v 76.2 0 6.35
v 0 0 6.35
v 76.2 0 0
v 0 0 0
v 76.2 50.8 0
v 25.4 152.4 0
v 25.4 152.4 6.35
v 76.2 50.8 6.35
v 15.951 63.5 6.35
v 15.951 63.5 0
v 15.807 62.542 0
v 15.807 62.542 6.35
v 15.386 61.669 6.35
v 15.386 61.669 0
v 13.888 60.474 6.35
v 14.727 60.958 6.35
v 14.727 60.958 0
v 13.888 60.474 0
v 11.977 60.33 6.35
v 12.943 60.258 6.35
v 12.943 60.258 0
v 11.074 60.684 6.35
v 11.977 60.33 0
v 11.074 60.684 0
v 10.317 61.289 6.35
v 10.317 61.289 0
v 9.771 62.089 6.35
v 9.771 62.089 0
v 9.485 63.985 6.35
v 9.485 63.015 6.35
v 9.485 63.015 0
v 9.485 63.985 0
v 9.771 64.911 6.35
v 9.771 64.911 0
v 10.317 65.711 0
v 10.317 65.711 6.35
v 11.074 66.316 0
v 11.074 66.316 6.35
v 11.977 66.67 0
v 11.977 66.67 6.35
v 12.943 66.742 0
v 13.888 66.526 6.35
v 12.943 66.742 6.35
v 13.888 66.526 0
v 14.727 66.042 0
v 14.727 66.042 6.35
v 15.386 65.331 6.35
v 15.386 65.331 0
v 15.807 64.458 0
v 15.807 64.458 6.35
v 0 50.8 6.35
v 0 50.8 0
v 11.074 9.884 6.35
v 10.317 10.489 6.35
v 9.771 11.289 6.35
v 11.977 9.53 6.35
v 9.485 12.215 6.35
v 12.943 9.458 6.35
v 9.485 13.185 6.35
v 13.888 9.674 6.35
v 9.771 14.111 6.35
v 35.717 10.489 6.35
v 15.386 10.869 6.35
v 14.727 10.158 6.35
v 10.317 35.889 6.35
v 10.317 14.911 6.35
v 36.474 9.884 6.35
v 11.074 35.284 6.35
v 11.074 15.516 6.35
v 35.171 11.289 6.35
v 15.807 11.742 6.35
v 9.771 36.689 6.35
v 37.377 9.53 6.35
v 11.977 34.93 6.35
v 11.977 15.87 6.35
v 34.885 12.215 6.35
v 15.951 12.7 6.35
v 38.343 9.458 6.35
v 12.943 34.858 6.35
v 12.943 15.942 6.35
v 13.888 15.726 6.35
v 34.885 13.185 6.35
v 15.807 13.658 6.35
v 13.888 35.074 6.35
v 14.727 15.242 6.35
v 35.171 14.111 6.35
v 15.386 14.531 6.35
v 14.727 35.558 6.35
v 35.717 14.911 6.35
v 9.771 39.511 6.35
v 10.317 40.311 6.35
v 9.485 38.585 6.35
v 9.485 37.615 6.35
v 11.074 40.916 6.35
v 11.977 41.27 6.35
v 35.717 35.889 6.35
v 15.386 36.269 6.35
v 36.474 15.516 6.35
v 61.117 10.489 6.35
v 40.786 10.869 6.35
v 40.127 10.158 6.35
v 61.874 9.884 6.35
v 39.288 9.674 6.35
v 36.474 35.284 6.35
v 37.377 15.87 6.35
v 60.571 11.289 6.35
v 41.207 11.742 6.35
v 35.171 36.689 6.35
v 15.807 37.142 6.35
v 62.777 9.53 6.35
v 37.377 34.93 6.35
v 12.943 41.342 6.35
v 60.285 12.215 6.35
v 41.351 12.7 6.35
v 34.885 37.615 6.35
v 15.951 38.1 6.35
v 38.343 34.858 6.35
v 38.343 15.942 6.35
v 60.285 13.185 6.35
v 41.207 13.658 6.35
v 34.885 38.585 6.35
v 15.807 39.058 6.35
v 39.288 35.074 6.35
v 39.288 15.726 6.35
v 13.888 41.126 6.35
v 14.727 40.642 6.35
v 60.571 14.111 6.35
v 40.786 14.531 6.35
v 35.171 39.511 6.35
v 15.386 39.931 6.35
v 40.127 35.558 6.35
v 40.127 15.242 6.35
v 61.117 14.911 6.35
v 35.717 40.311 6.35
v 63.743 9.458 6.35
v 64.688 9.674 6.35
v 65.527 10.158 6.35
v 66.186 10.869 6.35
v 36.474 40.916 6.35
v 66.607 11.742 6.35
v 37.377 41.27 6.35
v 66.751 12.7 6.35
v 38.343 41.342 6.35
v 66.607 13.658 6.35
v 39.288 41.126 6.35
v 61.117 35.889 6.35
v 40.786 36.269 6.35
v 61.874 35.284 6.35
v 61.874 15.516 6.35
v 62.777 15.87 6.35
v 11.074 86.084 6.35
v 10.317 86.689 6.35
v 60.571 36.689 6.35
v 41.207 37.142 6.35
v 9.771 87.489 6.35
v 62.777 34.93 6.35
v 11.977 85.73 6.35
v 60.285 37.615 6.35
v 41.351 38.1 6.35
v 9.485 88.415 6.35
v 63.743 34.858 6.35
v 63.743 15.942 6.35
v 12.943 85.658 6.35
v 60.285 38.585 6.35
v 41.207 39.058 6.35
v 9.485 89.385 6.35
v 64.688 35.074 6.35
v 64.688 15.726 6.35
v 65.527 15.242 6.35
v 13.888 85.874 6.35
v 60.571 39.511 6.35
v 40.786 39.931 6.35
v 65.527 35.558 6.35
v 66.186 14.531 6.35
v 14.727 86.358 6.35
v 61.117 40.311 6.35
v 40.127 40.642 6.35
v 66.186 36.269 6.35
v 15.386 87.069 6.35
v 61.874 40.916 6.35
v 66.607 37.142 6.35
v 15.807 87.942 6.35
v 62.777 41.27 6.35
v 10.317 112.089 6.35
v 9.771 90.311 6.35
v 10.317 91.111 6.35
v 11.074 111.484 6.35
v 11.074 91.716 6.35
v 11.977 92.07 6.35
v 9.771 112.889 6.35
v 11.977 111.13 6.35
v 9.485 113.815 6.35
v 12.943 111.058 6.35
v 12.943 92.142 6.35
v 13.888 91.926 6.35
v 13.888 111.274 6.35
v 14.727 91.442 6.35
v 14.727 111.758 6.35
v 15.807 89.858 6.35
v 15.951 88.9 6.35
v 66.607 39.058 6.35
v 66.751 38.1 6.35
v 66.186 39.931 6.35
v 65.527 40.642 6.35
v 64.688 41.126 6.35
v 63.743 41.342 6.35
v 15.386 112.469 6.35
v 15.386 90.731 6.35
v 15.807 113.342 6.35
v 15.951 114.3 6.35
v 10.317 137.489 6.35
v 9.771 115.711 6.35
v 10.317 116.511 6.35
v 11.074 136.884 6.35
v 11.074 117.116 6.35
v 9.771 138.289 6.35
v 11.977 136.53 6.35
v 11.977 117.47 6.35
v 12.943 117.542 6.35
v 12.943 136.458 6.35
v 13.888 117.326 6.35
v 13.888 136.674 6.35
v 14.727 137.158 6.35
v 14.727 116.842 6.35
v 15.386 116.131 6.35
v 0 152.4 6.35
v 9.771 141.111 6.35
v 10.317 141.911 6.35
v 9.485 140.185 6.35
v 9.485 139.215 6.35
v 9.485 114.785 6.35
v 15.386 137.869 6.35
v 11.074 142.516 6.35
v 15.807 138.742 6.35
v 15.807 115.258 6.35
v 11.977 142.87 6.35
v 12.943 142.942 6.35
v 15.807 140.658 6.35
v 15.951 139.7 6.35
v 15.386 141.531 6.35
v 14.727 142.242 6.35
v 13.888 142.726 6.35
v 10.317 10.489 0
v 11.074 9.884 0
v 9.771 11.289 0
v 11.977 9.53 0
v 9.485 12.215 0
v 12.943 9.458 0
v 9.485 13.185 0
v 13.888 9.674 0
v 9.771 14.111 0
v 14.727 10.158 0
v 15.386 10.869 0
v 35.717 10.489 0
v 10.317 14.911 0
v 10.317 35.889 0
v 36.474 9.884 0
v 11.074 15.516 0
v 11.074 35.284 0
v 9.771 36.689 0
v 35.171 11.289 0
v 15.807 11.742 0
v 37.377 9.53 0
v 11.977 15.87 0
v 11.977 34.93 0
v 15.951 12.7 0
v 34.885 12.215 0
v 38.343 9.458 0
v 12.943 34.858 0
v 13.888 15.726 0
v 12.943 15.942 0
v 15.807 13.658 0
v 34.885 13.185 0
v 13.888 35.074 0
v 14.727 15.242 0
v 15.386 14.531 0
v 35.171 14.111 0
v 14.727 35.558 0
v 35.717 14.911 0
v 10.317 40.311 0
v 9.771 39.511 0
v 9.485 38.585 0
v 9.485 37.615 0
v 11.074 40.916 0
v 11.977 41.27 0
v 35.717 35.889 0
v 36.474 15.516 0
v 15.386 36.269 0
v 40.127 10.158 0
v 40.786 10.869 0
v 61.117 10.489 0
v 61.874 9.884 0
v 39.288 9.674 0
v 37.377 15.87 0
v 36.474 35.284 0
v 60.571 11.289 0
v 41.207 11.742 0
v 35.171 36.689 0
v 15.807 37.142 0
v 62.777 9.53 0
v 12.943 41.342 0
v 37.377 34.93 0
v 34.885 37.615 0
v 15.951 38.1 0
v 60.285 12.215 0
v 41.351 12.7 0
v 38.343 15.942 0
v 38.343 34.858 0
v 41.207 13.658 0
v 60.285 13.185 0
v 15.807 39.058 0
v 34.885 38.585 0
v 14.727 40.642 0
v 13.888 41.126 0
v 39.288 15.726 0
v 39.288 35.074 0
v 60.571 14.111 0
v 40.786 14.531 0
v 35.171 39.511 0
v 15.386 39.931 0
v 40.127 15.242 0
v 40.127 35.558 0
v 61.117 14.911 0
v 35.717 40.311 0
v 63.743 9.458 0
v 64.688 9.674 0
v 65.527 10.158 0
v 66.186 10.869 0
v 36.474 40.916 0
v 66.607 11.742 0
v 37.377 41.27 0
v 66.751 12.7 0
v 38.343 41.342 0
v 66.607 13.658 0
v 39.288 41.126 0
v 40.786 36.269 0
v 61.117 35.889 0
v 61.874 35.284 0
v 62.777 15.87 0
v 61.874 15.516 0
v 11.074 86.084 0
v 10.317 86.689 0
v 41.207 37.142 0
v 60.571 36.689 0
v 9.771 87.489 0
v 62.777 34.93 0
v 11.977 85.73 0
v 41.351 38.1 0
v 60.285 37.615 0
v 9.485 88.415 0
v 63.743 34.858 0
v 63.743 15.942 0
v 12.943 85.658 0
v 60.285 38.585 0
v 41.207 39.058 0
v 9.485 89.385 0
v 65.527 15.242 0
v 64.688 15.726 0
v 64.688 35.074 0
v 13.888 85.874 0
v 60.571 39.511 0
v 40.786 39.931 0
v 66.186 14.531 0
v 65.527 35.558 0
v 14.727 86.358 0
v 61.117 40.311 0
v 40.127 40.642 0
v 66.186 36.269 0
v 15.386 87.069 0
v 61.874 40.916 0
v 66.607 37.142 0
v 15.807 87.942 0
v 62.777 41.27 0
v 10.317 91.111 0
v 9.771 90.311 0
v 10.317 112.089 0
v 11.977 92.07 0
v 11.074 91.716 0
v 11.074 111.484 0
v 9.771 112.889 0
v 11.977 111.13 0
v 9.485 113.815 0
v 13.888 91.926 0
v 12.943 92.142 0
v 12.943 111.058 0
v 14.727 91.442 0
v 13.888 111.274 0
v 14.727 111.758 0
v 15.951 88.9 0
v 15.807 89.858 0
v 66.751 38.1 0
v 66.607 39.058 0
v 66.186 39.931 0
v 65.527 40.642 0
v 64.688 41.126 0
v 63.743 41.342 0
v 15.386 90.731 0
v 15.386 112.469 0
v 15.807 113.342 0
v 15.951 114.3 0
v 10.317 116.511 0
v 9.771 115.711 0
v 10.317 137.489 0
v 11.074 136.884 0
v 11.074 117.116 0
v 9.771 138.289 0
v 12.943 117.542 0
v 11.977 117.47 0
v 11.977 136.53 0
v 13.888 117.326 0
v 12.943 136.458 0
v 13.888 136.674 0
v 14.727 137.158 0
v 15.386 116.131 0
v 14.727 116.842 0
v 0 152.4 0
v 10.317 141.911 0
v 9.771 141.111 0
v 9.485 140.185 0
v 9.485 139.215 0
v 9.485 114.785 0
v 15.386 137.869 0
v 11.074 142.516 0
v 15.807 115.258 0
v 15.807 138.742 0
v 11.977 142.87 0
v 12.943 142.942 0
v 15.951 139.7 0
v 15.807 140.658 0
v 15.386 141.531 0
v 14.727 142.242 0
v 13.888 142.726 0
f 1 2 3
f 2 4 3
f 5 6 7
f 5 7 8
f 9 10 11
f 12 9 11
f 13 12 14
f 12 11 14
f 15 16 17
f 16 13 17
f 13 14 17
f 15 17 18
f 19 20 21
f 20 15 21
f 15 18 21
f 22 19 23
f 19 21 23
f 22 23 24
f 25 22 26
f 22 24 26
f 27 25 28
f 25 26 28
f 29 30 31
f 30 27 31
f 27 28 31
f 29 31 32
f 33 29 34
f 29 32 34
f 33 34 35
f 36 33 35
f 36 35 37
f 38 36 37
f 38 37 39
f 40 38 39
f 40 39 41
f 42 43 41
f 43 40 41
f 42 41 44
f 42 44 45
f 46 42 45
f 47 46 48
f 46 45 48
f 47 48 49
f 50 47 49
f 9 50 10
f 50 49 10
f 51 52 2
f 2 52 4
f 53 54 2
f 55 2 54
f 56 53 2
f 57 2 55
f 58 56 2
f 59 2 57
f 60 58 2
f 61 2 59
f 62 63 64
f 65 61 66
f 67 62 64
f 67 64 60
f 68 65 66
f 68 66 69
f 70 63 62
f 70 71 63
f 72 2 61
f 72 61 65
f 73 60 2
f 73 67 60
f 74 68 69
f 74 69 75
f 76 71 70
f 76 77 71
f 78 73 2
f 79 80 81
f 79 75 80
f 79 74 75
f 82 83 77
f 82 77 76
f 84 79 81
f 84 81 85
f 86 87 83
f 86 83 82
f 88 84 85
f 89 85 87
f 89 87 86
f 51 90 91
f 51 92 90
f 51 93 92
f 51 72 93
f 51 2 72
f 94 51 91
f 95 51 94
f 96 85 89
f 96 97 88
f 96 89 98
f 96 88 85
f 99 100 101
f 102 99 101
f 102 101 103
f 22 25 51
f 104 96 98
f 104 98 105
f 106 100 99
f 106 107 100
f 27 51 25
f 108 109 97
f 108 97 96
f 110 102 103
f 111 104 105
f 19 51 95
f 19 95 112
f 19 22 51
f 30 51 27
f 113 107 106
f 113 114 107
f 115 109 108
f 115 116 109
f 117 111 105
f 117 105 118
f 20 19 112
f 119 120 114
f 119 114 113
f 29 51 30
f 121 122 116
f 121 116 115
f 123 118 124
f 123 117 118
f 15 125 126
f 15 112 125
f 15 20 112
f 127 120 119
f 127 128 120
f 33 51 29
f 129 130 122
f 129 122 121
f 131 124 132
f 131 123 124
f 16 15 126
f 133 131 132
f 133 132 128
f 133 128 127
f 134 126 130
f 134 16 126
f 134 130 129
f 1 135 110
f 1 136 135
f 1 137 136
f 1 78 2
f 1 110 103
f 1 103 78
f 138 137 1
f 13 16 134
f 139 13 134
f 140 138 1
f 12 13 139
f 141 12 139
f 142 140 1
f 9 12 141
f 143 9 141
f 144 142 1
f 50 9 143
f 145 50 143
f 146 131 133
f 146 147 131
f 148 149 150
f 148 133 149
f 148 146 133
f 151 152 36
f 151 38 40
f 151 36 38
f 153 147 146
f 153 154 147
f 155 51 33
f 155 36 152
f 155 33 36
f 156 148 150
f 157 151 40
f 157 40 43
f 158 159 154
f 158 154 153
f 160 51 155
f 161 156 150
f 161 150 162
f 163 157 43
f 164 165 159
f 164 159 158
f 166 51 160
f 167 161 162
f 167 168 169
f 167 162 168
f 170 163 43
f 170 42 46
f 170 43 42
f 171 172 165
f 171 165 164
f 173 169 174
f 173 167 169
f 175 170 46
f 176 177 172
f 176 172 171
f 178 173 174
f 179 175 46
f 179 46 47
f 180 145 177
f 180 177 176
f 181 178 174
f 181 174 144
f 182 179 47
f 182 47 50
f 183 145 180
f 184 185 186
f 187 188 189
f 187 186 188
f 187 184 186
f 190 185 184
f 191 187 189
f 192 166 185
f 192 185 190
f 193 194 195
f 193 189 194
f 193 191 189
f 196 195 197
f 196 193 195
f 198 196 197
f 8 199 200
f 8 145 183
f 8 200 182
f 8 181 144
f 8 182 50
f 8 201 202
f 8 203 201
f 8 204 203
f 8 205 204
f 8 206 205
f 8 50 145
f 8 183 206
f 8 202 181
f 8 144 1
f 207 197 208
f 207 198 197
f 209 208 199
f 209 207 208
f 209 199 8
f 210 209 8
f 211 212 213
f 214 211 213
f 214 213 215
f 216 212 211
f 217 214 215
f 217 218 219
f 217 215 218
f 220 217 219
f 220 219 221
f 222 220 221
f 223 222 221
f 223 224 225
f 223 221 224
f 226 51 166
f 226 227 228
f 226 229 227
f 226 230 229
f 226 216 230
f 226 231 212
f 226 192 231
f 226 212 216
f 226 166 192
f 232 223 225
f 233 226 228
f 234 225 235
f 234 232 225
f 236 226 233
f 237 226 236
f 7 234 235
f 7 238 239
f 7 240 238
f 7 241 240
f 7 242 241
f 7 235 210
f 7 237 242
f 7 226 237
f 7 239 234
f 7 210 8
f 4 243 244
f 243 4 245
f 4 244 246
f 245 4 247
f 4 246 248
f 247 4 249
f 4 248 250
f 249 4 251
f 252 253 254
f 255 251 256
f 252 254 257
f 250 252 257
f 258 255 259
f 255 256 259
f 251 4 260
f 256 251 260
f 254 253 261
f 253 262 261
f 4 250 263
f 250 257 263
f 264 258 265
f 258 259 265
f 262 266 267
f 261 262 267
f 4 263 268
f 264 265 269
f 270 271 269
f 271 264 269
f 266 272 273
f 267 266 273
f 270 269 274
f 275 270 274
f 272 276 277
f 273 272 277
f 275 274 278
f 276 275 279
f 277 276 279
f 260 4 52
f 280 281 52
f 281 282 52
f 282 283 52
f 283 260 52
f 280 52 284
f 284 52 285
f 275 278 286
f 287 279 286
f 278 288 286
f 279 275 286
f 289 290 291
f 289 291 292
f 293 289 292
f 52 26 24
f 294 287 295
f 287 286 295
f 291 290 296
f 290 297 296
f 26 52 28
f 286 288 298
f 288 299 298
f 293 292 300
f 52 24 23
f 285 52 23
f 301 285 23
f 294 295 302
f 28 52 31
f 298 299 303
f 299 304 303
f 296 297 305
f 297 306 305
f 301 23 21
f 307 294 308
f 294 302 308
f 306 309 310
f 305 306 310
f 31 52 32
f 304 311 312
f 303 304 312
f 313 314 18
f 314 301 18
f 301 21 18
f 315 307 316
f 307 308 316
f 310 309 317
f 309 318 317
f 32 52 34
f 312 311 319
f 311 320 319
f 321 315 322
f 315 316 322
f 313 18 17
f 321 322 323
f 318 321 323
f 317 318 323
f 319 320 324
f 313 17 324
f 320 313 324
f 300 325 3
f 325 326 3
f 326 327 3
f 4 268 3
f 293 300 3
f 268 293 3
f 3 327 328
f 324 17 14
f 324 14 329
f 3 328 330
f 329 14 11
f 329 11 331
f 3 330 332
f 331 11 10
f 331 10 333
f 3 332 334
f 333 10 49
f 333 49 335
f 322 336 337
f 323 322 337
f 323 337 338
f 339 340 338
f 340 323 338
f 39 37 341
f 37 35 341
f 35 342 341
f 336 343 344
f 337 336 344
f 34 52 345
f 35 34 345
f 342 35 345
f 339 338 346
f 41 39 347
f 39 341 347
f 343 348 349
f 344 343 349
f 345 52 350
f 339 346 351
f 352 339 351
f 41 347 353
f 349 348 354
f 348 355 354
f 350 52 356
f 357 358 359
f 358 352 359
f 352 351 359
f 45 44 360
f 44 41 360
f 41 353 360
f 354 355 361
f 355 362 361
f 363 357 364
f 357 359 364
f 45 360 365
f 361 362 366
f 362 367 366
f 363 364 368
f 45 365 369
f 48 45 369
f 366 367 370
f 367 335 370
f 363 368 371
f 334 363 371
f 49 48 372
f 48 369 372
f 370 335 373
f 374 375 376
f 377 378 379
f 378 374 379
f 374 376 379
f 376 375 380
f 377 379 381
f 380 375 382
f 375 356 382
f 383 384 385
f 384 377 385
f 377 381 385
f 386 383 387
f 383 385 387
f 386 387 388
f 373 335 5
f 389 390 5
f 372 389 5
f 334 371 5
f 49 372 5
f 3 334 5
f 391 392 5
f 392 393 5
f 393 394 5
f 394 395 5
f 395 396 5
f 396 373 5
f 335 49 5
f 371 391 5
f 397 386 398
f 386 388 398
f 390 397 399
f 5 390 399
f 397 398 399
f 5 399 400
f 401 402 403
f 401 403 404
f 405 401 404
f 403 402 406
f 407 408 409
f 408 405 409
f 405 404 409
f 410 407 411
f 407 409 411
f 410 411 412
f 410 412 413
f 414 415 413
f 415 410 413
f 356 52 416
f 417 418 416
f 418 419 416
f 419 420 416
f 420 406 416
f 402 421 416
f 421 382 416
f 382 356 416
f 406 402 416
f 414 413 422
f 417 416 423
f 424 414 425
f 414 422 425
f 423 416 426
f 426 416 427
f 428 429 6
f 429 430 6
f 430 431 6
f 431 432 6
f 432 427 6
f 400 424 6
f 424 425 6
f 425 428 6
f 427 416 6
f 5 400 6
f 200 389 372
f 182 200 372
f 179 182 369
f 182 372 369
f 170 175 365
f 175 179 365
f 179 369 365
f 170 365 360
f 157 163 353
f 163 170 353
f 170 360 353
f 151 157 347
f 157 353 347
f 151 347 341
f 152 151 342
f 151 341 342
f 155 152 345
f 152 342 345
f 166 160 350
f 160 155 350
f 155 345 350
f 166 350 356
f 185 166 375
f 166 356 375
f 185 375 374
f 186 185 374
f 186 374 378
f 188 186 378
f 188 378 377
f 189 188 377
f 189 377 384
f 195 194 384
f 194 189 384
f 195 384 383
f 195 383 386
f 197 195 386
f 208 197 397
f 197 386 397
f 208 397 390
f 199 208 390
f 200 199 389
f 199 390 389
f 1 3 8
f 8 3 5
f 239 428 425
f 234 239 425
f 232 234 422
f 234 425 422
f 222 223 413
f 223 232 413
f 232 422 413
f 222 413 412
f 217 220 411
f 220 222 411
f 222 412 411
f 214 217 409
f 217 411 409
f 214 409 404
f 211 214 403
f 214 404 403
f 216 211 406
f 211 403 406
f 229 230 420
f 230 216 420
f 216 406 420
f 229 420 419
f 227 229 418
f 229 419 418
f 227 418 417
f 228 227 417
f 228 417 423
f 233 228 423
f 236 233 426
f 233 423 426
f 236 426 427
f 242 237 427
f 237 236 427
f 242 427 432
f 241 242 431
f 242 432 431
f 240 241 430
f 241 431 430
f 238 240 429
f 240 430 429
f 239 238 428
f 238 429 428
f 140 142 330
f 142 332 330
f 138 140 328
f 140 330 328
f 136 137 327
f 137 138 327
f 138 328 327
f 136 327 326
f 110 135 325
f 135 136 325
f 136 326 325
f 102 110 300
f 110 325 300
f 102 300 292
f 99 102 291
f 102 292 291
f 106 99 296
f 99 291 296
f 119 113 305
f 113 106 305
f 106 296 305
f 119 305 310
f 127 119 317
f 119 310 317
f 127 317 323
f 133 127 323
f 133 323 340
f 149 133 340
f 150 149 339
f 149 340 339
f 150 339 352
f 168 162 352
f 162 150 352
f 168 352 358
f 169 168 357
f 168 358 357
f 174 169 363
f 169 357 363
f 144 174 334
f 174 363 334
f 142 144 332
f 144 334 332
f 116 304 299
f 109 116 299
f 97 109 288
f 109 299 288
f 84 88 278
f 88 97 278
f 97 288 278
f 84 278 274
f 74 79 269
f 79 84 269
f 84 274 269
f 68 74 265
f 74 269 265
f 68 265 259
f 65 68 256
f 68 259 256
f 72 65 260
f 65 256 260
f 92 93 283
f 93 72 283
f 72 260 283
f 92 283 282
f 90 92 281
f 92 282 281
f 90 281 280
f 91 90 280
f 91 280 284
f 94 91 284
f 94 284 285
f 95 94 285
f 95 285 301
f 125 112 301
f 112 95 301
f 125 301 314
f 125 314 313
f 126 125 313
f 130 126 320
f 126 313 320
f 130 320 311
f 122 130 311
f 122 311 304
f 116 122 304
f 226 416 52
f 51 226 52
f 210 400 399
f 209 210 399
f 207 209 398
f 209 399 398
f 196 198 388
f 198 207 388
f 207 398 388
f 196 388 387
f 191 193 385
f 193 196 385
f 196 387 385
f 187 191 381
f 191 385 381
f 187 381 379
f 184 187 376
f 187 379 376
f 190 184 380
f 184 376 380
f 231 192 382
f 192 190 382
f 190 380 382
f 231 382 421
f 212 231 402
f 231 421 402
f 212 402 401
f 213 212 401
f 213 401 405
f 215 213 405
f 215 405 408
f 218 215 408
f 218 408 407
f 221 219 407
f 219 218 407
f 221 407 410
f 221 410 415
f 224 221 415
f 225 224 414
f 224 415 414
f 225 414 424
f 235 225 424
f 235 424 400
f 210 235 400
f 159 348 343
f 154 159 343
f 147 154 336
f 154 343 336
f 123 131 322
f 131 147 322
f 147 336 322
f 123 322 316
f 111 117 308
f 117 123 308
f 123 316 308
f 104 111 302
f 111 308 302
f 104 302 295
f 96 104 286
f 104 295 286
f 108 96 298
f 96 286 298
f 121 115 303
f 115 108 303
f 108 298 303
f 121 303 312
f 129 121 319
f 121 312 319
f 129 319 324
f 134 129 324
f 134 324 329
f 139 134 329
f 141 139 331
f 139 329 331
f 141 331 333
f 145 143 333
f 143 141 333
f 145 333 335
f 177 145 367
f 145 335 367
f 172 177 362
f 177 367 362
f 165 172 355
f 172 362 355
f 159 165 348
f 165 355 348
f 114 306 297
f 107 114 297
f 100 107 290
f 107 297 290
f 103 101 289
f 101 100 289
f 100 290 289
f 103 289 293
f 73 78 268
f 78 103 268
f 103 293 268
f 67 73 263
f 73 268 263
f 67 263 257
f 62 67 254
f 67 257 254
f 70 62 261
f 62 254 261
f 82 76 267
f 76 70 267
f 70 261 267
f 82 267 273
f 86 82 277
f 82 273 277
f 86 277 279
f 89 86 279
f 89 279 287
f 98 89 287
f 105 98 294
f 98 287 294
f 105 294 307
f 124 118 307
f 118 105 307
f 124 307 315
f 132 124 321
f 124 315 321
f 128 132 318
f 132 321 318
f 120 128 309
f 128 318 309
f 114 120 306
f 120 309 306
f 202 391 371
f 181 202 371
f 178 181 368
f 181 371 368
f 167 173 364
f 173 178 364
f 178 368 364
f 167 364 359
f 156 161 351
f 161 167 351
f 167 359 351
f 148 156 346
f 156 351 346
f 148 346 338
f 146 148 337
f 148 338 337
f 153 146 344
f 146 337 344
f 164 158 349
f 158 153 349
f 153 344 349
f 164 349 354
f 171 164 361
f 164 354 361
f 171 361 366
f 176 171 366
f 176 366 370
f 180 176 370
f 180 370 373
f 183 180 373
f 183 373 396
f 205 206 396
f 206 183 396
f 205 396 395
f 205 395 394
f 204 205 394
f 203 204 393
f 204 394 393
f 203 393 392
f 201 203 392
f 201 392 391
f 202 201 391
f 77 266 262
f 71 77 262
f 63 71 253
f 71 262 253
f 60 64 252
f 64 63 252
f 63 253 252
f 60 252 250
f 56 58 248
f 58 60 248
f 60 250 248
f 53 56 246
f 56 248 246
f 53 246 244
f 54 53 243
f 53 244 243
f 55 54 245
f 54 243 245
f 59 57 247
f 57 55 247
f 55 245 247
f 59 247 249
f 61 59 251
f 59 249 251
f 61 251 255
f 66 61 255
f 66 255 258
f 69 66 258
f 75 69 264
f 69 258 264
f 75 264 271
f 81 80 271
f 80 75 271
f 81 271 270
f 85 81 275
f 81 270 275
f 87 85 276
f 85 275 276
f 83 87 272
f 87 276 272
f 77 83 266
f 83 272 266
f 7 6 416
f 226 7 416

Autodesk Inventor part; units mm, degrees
ref_plane "YZ Plane" through (0, 0, 0) normal (1, 0, 0) x (0, 1, 0)
ref_plane "XZ Plane" through (0, 0, 0) normal (0, 1, 0) x (-1, 0, 0)
ref_plane "XY Plane" through (0, 0, 0) normal (0, 0, 1) x (1, 0, 0)
sketch "Sketch1" plane through (0, 0, 0) normal (0, 0, 1) x (1, 0, 0)
  line L0 (0, 0) -> (76.2, 0)
  line L1 (76.2, 0) -> (76.2, 50.8)
  line L2 (0, 50.8) -> (0, 0)
  line L3 (25.4, 152.4) -> (0, 152.4)
  line L4 (0, 152.4) -> (0, 50.8)
  line L5 (25.4, 152.4) -> (76.2, 50.8)
  circle A0 centre (12.7, 12.7) radius 3.2512
  circle A1 centre (12.7, 38.1) radius 3.2512
  circle A2 centre (12.7, 63.5) radius 3.2512
  circle A3 centre (12.7, 88.9) radius 3.2512
  circle A4 centre (12.7, 114.3) radius 3.2512
  circle A5 centre (12.7, 139.7) radius 3.2512
  circle A6 centre (38.1, 12.7) radius 3.2512
  circle A7 centre (63.5, 12.7) radius 3.2512
  circle A8 centre (12.7, 38.1) radius 3.2512
  circle A9 centre (38.1, 38.1) radius 3.2512
  circle A10 centre (63.5, 38.1) radius 3.2512
  dimension "d4" = 101.6
  dimension "d5" = 50.8
  dimension "d6" = 25.4
  dimension "d7" = 50.8
  dimension "d8" = 101.6
  dimension "d9" = 50.8
  dimension "d10" = 76.2
  dimension "d11" = 6.5024
  dimension "d12" = 12.7
  dimension "d13" = 12.7
  dimension "d16" = 25.4
  dimension "d23" = 25.4
  dimension "d26" = 25.4
extrude "Extrusion1" add sketch "Sketch1" along normal blind 6.35
properties part number "6x3"
